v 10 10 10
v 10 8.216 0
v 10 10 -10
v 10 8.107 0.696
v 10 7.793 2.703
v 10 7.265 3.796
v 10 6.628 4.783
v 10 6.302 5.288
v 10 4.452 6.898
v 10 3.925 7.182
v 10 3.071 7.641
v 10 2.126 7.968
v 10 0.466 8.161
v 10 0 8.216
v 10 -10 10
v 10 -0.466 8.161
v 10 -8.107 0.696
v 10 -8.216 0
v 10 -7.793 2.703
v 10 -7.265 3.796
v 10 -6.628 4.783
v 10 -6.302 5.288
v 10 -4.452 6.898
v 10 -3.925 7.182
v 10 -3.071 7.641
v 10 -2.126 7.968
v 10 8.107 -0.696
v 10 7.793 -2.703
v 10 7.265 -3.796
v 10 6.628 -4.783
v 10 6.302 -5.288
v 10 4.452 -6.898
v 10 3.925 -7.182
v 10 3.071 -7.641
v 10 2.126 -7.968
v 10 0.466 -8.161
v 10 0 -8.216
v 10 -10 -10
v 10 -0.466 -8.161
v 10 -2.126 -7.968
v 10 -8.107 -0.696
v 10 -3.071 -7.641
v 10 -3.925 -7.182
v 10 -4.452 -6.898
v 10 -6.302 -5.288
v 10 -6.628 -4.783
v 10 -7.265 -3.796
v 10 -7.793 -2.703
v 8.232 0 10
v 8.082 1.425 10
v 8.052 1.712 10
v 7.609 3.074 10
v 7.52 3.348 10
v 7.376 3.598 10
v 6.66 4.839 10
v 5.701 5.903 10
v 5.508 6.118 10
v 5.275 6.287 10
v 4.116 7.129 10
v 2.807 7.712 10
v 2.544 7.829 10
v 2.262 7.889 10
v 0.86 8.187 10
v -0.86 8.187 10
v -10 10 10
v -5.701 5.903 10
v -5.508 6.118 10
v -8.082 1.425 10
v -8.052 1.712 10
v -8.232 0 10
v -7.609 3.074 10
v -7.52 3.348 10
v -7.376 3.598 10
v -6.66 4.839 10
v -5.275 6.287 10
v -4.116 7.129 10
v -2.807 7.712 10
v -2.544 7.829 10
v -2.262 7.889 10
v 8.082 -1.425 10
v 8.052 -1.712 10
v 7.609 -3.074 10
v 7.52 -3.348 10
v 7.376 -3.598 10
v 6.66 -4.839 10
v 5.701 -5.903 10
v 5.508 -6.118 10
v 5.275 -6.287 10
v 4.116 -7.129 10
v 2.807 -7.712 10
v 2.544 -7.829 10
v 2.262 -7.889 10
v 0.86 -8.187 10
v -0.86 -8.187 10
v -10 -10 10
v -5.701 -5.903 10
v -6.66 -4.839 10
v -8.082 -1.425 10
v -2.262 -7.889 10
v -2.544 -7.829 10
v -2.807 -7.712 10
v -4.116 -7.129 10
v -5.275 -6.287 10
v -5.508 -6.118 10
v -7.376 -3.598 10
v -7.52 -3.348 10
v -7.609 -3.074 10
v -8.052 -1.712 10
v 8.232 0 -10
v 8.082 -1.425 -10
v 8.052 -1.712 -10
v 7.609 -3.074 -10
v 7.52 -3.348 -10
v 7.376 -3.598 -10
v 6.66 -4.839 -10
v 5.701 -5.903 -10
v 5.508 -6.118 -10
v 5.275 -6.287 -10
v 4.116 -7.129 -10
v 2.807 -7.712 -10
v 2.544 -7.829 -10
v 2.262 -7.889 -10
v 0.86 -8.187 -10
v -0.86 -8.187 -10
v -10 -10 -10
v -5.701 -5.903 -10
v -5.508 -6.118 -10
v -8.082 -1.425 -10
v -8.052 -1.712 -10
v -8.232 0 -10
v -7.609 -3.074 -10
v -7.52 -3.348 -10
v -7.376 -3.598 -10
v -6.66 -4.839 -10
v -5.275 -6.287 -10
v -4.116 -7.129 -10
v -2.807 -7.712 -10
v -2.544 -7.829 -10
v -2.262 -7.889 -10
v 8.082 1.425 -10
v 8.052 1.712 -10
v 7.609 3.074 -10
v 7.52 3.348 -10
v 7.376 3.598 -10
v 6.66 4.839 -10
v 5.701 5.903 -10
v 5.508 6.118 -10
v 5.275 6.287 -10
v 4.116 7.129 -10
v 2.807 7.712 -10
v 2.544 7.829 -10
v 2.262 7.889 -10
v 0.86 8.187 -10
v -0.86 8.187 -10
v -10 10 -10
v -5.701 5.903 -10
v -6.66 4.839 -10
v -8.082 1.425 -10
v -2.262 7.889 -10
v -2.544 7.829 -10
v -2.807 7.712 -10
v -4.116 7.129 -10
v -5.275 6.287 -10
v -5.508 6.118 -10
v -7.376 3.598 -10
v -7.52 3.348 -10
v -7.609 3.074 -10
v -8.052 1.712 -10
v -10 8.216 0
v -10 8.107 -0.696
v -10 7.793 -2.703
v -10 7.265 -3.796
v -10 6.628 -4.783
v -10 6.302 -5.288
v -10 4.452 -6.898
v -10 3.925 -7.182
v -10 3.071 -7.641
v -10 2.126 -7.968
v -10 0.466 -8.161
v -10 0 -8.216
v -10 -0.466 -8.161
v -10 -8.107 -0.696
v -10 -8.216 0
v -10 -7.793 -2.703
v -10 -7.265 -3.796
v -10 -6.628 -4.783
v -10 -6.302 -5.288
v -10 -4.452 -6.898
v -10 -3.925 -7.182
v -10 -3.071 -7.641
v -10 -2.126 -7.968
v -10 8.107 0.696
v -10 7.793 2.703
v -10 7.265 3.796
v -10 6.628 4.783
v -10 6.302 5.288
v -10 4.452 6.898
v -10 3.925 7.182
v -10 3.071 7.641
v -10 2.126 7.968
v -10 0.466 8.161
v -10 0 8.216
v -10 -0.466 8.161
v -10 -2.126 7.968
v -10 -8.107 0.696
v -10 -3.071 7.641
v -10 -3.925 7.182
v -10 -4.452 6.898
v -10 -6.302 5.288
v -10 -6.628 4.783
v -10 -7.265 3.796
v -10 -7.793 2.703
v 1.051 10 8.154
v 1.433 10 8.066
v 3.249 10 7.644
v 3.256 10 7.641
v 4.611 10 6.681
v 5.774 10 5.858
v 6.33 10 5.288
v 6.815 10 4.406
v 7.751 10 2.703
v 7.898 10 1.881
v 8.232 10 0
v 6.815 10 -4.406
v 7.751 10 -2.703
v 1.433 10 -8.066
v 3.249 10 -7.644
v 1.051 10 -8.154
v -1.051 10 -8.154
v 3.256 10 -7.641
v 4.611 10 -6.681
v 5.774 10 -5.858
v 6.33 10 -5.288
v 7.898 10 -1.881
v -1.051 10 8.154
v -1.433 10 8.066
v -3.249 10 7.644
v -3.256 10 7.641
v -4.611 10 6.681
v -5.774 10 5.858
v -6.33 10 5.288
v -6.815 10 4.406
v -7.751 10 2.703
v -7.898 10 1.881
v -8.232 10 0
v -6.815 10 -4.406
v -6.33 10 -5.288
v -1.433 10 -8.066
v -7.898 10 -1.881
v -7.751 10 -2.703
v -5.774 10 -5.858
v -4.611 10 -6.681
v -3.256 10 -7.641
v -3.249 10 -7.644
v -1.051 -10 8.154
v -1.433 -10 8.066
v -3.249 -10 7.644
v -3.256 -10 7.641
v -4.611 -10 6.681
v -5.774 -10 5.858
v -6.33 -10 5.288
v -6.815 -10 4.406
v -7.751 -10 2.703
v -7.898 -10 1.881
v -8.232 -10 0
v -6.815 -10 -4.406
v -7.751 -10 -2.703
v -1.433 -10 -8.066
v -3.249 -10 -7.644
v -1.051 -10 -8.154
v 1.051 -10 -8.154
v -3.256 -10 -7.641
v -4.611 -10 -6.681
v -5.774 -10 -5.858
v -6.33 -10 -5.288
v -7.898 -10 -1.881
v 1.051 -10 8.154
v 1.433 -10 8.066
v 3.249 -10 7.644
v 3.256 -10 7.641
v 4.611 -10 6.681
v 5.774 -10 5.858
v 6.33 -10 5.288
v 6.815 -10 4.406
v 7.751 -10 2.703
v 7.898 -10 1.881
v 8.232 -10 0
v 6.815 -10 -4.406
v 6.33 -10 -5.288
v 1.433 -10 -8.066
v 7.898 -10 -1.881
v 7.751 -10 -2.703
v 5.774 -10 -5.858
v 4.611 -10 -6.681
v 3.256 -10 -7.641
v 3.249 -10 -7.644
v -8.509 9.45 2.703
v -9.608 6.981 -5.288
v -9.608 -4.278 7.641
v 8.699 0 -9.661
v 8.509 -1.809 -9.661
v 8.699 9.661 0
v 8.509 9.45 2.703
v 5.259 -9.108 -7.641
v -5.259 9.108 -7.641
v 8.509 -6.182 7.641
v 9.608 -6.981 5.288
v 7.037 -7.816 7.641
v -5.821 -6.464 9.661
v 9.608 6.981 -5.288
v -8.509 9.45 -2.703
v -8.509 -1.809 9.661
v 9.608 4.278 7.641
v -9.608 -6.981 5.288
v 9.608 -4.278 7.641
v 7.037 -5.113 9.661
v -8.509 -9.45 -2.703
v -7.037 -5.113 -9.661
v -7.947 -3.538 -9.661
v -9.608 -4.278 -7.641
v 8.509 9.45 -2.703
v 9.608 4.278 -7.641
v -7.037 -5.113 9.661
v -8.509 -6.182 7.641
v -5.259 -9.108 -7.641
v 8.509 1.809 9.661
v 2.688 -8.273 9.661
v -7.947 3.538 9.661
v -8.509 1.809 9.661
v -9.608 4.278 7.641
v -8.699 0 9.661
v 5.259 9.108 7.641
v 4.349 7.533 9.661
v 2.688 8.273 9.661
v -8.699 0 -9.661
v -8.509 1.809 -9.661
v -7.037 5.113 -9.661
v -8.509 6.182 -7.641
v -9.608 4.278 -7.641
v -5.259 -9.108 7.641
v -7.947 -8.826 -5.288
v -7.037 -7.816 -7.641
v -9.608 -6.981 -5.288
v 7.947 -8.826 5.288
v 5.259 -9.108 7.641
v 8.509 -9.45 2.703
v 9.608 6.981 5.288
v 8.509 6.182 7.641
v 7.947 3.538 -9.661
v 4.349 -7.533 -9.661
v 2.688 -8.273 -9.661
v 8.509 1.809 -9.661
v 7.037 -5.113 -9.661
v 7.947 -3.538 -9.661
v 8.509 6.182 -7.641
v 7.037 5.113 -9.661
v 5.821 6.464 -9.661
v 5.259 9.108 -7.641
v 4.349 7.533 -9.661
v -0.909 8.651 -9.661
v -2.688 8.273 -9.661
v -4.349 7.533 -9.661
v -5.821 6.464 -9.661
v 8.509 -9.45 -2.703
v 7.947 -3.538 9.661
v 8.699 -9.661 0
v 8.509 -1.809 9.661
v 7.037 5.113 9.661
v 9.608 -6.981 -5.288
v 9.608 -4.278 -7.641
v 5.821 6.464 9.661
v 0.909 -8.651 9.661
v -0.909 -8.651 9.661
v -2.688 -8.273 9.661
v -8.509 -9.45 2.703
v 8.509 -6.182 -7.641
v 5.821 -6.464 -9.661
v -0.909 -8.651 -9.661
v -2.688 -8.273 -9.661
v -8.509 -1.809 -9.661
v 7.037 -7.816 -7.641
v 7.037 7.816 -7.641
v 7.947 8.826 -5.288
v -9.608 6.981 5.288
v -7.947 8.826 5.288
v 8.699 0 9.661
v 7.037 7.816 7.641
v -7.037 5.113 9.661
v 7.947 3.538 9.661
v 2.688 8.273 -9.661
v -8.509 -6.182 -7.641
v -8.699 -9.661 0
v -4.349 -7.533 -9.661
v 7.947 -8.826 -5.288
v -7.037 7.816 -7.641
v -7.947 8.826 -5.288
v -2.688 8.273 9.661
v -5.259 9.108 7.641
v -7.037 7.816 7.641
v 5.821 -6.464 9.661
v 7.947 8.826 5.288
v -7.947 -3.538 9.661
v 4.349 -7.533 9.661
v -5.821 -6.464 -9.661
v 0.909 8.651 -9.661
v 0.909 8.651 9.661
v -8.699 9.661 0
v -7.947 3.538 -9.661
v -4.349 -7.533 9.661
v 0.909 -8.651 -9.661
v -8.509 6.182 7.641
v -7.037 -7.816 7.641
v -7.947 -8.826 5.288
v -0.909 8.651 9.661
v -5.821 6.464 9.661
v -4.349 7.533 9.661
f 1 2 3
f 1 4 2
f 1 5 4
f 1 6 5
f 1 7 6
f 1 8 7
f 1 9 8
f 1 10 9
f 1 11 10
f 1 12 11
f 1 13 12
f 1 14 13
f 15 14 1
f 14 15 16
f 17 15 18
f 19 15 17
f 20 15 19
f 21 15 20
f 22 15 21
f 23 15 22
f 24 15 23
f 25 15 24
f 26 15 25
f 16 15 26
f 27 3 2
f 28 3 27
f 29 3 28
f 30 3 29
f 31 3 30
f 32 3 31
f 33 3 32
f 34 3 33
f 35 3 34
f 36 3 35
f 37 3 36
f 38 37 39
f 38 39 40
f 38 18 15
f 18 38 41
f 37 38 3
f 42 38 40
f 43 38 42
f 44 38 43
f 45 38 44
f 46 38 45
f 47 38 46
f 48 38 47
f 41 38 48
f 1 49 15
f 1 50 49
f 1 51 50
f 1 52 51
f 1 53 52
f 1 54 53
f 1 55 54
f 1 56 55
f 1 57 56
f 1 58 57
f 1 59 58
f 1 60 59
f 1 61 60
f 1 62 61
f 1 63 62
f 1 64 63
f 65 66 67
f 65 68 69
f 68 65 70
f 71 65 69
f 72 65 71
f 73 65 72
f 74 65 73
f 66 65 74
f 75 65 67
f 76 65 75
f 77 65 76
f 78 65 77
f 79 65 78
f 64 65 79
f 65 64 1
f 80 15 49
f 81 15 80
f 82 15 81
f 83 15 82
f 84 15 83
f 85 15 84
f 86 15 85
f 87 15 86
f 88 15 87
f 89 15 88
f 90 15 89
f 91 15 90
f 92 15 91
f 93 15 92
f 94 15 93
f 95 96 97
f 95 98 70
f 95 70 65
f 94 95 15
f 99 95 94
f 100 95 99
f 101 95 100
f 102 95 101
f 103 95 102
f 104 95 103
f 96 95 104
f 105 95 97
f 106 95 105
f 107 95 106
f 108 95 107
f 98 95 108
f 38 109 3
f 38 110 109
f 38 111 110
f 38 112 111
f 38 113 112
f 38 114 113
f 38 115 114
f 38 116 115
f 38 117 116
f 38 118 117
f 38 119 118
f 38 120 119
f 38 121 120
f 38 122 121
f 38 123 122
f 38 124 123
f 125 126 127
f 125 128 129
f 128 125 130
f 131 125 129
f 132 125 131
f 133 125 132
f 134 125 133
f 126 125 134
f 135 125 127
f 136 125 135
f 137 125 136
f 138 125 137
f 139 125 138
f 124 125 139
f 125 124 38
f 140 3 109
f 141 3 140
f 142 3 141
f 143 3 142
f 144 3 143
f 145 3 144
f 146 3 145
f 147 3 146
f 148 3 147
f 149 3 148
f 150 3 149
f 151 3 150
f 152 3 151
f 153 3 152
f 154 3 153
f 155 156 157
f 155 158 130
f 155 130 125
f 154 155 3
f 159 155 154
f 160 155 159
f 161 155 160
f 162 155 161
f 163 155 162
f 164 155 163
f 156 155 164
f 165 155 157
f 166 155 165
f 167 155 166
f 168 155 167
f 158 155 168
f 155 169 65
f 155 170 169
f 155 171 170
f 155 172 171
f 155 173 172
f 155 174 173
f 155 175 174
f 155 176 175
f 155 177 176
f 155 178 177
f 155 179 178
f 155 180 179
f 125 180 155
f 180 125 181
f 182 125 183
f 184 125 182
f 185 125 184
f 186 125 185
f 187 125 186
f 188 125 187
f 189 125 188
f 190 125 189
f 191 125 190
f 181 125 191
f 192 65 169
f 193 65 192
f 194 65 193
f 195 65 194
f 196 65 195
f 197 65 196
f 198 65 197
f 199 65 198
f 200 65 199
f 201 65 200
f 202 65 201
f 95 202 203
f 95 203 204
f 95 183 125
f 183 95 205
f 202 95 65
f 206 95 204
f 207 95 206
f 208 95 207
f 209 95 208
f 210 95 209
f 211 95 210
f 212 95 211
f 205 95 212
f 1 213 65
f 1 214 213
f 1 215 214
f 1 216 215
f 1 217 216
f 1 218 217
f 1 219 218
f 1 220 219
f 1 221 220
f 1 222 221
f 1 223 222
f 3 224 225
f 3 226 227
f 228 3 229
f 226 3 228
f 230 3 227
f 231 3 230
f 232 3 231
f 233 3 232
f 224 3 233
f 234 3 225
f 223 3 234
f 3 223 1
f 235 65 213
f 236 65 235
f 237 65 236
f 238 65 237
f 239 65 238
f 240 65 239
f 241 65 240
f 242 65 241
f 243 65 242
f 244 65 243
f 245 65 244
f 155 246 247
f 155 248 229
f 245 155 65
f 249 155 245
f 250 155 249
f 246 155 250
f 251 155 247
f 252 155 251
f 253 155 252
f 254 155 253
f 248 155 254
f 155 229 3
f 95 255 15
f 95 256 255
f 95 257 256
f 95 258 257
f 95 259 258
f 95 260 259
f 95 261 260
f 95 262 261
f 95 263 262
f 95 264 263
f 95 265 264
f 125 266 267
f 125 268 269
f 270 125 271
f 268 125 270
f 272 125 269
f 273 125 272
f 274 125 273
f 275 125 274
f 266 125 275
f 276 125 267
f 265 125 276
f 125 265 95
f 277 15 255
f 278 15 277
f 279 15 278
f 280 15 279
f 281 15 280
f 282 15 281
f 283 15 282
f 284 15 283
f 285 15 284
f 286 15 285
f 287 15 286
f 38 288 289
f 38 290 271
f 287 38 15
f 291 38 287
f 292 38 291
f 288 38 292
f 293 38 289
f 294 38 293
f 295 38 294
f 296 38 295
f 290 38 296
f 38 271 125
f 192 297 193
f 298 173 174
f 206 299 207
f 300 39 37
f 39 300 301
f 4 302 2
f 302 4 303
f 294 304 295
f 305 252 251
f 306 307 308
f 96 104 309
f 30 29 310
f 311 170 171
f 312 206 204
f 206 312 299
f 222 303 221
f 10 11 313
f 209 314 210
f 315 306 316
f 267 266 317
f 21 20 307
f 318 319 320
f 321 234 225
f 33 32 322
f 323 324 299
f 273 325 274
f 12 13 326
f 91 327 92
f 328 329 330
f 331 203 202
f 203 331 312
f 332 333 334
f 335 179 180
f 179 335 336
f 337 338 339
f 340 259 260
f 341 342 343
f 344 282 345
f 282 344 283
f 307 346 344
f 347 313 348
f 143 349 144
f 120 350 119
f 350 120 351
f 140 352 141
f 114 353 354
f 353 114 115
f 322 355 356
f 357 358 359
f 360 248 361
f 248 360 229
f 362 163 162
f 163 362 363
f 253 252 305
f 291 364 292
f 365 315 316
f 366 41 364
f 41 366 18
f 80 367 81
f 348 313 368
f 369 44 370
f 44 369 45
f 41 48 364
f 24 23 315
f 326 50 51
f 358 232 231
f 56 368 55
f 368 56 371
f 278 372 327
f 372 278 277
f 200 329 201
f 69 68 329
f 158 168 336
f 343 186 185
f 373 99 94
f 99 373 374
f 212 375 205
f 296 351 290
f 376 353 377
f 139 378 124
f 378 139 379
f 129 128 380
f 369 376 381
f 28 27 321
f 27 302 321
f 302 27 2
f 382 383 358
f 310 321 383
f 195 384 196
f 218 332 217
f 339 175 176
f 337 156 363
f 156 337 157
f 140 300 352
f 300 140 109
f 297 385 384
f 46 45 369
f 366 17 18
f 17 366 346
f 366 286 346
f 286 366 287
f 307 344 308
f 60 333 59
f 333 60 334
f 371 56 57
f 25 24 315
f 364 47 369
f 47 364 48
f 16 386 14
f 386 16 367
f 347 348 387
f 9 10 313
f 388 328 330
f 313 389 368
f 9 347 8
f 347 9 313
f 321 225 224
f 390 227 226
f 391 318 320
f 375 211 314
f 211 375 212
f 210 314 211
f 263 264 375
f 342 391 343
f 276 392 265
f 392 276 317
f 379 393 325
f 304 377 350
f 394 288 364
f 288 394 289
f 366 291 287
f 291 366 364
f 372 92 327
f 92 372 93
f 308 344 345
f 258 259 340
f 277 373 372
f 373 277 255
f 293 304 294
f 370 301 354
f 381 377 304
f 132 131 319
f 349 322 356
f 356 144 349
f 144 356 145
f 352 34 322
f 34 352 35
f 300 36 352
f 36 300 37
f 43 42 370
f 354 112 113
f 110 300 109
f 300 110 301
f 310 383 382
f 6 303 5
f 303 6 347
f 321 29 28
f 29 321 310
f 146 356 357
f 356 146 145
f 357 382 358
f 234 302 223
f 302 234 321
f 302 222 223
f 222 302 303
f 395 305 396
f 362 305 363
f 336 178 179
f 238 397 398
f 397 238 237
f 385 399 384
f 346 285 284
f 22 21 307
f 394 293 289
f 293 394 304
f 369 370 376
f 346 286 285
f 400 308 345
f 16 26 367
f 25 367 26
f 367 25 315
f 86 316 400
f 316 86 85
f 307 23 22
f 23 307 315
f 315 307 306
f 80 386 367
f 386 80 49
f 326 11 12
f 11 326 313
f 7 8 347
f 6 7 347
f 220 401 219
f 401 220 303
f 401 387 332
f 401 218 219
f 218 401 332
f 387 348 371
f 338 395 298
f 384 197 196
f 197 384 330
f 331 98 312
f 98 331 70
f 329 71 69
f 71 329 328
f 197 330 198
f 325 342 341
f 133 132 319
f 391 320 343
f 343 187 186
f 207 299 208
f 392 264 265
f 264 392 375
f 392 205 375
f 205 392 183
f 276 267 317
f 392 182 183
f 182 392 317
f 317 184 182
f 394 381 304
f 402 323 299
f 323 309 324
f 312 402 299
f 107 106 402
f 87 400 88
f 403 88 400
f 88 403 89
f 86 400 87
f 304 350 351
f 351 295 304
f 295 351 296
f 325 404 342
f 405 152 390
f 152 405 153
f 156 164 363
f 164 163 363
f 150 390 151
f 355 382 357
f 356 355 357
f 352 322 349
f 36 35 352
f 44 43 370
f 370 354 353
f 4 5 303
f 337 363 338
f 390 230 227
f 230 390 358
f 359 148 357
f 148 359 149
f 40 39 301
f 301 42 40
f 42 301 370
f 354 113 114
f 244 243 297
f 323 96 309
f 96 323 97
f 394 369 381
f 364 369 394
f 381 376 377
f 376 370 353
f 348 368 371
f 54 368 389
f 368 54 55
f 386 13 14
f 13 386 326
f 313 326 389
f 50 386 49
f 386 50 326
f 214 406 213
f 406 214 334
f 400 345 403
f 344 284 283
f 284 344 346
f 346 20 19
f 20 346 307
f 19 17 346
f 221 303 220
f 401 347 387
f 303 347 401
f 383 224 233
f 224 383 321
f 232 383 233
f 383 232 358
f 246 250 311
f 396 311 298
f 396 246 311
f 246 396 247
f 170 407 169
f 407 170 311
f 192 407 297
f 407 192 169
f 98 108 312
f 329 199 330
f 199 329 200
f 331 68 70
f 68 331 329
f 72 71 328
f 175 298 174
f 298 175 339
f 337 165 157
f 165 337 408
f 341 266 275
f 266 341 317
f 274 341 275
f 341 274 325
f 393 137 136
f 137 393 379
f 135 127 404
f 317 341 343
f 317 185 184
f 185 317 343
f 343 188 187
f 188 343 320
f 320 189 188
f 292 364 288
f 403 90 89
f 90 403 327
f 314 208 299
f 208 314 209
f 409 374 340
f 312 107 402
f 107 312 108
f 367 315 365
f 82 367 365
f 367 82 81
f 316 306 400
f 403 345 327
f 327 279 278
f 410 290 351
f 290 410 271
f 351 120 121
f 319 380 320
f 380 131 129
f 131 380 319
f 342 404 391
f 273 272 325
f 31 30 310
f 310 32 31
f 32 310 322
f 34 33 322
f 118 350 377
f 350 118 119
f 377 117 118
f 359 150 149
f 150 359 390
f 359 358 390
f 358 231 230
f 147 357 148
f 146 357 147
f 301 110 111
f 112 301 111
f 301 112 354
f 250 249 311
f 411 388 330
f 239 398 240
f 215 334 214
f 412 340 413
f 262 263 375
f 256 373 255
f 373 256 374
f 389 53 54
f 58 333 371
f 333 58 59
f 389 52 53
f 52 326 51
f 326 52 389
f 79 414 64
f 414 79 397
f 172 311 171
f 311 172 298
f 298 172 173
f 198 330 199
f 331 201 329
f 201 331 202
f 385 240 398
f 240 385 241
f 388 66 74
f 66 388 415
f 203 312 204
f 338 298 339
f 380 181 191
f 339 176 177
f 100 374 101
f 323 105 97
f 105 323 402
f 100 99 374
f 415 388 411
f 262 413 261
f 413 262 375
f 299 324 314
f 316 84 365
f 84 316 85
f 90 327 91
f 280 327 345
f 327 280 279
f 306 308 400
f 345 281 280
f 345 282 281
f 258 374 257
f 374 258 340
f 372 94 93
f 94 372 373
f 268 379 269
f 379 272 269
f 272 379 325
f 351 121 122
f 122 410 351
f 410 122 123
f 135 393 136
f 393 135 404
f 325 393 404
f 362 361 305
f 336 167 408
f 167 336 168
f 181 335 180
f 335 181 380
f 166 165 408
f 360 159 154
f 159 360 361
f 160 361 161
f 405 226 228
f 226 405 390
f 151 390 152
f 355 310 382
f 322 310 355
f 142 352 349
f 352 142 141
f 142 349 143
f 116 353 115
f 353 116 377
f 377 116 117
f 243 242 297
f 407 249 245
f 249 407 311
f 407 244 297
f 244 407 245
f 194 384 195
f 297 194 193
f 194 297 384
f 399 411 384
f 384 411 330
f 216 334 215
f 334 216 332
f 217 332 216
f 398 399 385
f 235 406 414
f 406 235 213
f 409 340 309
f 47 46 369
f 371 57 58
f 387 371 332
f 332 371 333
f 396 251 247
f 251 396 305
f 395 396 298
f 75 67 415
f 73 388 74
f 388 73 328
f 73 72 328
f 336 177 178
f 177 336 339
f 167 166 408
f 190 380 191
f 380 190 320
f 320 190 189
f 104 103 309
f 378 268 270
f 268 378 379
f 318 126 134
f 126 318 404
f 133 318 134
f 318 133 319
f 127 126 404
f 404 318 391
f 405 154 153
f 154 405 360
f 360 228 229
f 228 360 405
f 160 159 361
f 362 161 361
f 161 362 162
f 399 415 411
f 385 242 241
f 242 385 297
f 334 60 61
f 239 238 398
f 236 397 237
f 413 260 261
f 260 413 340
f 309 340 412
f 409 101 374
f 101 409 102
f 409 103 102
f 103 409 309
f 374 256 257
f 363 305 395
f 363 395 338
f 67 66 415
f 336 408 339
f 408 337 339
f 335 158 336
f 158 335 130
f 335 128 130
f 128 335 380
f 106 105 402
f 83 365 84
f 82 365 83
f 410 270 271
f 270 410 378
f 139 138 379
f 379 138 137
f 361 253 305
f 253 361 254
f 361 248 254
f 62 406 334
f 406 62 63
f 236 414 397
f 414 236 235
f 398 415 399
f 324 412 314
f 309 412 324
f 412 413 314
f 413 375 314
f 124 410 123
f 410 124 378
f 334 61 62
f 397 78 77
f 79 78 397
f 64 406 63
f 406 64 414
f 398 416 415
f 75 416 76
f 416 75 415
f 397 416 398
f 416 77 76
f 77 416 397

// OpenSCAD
difference() {
    cube(20, center = true);
    sphere(13);
}
